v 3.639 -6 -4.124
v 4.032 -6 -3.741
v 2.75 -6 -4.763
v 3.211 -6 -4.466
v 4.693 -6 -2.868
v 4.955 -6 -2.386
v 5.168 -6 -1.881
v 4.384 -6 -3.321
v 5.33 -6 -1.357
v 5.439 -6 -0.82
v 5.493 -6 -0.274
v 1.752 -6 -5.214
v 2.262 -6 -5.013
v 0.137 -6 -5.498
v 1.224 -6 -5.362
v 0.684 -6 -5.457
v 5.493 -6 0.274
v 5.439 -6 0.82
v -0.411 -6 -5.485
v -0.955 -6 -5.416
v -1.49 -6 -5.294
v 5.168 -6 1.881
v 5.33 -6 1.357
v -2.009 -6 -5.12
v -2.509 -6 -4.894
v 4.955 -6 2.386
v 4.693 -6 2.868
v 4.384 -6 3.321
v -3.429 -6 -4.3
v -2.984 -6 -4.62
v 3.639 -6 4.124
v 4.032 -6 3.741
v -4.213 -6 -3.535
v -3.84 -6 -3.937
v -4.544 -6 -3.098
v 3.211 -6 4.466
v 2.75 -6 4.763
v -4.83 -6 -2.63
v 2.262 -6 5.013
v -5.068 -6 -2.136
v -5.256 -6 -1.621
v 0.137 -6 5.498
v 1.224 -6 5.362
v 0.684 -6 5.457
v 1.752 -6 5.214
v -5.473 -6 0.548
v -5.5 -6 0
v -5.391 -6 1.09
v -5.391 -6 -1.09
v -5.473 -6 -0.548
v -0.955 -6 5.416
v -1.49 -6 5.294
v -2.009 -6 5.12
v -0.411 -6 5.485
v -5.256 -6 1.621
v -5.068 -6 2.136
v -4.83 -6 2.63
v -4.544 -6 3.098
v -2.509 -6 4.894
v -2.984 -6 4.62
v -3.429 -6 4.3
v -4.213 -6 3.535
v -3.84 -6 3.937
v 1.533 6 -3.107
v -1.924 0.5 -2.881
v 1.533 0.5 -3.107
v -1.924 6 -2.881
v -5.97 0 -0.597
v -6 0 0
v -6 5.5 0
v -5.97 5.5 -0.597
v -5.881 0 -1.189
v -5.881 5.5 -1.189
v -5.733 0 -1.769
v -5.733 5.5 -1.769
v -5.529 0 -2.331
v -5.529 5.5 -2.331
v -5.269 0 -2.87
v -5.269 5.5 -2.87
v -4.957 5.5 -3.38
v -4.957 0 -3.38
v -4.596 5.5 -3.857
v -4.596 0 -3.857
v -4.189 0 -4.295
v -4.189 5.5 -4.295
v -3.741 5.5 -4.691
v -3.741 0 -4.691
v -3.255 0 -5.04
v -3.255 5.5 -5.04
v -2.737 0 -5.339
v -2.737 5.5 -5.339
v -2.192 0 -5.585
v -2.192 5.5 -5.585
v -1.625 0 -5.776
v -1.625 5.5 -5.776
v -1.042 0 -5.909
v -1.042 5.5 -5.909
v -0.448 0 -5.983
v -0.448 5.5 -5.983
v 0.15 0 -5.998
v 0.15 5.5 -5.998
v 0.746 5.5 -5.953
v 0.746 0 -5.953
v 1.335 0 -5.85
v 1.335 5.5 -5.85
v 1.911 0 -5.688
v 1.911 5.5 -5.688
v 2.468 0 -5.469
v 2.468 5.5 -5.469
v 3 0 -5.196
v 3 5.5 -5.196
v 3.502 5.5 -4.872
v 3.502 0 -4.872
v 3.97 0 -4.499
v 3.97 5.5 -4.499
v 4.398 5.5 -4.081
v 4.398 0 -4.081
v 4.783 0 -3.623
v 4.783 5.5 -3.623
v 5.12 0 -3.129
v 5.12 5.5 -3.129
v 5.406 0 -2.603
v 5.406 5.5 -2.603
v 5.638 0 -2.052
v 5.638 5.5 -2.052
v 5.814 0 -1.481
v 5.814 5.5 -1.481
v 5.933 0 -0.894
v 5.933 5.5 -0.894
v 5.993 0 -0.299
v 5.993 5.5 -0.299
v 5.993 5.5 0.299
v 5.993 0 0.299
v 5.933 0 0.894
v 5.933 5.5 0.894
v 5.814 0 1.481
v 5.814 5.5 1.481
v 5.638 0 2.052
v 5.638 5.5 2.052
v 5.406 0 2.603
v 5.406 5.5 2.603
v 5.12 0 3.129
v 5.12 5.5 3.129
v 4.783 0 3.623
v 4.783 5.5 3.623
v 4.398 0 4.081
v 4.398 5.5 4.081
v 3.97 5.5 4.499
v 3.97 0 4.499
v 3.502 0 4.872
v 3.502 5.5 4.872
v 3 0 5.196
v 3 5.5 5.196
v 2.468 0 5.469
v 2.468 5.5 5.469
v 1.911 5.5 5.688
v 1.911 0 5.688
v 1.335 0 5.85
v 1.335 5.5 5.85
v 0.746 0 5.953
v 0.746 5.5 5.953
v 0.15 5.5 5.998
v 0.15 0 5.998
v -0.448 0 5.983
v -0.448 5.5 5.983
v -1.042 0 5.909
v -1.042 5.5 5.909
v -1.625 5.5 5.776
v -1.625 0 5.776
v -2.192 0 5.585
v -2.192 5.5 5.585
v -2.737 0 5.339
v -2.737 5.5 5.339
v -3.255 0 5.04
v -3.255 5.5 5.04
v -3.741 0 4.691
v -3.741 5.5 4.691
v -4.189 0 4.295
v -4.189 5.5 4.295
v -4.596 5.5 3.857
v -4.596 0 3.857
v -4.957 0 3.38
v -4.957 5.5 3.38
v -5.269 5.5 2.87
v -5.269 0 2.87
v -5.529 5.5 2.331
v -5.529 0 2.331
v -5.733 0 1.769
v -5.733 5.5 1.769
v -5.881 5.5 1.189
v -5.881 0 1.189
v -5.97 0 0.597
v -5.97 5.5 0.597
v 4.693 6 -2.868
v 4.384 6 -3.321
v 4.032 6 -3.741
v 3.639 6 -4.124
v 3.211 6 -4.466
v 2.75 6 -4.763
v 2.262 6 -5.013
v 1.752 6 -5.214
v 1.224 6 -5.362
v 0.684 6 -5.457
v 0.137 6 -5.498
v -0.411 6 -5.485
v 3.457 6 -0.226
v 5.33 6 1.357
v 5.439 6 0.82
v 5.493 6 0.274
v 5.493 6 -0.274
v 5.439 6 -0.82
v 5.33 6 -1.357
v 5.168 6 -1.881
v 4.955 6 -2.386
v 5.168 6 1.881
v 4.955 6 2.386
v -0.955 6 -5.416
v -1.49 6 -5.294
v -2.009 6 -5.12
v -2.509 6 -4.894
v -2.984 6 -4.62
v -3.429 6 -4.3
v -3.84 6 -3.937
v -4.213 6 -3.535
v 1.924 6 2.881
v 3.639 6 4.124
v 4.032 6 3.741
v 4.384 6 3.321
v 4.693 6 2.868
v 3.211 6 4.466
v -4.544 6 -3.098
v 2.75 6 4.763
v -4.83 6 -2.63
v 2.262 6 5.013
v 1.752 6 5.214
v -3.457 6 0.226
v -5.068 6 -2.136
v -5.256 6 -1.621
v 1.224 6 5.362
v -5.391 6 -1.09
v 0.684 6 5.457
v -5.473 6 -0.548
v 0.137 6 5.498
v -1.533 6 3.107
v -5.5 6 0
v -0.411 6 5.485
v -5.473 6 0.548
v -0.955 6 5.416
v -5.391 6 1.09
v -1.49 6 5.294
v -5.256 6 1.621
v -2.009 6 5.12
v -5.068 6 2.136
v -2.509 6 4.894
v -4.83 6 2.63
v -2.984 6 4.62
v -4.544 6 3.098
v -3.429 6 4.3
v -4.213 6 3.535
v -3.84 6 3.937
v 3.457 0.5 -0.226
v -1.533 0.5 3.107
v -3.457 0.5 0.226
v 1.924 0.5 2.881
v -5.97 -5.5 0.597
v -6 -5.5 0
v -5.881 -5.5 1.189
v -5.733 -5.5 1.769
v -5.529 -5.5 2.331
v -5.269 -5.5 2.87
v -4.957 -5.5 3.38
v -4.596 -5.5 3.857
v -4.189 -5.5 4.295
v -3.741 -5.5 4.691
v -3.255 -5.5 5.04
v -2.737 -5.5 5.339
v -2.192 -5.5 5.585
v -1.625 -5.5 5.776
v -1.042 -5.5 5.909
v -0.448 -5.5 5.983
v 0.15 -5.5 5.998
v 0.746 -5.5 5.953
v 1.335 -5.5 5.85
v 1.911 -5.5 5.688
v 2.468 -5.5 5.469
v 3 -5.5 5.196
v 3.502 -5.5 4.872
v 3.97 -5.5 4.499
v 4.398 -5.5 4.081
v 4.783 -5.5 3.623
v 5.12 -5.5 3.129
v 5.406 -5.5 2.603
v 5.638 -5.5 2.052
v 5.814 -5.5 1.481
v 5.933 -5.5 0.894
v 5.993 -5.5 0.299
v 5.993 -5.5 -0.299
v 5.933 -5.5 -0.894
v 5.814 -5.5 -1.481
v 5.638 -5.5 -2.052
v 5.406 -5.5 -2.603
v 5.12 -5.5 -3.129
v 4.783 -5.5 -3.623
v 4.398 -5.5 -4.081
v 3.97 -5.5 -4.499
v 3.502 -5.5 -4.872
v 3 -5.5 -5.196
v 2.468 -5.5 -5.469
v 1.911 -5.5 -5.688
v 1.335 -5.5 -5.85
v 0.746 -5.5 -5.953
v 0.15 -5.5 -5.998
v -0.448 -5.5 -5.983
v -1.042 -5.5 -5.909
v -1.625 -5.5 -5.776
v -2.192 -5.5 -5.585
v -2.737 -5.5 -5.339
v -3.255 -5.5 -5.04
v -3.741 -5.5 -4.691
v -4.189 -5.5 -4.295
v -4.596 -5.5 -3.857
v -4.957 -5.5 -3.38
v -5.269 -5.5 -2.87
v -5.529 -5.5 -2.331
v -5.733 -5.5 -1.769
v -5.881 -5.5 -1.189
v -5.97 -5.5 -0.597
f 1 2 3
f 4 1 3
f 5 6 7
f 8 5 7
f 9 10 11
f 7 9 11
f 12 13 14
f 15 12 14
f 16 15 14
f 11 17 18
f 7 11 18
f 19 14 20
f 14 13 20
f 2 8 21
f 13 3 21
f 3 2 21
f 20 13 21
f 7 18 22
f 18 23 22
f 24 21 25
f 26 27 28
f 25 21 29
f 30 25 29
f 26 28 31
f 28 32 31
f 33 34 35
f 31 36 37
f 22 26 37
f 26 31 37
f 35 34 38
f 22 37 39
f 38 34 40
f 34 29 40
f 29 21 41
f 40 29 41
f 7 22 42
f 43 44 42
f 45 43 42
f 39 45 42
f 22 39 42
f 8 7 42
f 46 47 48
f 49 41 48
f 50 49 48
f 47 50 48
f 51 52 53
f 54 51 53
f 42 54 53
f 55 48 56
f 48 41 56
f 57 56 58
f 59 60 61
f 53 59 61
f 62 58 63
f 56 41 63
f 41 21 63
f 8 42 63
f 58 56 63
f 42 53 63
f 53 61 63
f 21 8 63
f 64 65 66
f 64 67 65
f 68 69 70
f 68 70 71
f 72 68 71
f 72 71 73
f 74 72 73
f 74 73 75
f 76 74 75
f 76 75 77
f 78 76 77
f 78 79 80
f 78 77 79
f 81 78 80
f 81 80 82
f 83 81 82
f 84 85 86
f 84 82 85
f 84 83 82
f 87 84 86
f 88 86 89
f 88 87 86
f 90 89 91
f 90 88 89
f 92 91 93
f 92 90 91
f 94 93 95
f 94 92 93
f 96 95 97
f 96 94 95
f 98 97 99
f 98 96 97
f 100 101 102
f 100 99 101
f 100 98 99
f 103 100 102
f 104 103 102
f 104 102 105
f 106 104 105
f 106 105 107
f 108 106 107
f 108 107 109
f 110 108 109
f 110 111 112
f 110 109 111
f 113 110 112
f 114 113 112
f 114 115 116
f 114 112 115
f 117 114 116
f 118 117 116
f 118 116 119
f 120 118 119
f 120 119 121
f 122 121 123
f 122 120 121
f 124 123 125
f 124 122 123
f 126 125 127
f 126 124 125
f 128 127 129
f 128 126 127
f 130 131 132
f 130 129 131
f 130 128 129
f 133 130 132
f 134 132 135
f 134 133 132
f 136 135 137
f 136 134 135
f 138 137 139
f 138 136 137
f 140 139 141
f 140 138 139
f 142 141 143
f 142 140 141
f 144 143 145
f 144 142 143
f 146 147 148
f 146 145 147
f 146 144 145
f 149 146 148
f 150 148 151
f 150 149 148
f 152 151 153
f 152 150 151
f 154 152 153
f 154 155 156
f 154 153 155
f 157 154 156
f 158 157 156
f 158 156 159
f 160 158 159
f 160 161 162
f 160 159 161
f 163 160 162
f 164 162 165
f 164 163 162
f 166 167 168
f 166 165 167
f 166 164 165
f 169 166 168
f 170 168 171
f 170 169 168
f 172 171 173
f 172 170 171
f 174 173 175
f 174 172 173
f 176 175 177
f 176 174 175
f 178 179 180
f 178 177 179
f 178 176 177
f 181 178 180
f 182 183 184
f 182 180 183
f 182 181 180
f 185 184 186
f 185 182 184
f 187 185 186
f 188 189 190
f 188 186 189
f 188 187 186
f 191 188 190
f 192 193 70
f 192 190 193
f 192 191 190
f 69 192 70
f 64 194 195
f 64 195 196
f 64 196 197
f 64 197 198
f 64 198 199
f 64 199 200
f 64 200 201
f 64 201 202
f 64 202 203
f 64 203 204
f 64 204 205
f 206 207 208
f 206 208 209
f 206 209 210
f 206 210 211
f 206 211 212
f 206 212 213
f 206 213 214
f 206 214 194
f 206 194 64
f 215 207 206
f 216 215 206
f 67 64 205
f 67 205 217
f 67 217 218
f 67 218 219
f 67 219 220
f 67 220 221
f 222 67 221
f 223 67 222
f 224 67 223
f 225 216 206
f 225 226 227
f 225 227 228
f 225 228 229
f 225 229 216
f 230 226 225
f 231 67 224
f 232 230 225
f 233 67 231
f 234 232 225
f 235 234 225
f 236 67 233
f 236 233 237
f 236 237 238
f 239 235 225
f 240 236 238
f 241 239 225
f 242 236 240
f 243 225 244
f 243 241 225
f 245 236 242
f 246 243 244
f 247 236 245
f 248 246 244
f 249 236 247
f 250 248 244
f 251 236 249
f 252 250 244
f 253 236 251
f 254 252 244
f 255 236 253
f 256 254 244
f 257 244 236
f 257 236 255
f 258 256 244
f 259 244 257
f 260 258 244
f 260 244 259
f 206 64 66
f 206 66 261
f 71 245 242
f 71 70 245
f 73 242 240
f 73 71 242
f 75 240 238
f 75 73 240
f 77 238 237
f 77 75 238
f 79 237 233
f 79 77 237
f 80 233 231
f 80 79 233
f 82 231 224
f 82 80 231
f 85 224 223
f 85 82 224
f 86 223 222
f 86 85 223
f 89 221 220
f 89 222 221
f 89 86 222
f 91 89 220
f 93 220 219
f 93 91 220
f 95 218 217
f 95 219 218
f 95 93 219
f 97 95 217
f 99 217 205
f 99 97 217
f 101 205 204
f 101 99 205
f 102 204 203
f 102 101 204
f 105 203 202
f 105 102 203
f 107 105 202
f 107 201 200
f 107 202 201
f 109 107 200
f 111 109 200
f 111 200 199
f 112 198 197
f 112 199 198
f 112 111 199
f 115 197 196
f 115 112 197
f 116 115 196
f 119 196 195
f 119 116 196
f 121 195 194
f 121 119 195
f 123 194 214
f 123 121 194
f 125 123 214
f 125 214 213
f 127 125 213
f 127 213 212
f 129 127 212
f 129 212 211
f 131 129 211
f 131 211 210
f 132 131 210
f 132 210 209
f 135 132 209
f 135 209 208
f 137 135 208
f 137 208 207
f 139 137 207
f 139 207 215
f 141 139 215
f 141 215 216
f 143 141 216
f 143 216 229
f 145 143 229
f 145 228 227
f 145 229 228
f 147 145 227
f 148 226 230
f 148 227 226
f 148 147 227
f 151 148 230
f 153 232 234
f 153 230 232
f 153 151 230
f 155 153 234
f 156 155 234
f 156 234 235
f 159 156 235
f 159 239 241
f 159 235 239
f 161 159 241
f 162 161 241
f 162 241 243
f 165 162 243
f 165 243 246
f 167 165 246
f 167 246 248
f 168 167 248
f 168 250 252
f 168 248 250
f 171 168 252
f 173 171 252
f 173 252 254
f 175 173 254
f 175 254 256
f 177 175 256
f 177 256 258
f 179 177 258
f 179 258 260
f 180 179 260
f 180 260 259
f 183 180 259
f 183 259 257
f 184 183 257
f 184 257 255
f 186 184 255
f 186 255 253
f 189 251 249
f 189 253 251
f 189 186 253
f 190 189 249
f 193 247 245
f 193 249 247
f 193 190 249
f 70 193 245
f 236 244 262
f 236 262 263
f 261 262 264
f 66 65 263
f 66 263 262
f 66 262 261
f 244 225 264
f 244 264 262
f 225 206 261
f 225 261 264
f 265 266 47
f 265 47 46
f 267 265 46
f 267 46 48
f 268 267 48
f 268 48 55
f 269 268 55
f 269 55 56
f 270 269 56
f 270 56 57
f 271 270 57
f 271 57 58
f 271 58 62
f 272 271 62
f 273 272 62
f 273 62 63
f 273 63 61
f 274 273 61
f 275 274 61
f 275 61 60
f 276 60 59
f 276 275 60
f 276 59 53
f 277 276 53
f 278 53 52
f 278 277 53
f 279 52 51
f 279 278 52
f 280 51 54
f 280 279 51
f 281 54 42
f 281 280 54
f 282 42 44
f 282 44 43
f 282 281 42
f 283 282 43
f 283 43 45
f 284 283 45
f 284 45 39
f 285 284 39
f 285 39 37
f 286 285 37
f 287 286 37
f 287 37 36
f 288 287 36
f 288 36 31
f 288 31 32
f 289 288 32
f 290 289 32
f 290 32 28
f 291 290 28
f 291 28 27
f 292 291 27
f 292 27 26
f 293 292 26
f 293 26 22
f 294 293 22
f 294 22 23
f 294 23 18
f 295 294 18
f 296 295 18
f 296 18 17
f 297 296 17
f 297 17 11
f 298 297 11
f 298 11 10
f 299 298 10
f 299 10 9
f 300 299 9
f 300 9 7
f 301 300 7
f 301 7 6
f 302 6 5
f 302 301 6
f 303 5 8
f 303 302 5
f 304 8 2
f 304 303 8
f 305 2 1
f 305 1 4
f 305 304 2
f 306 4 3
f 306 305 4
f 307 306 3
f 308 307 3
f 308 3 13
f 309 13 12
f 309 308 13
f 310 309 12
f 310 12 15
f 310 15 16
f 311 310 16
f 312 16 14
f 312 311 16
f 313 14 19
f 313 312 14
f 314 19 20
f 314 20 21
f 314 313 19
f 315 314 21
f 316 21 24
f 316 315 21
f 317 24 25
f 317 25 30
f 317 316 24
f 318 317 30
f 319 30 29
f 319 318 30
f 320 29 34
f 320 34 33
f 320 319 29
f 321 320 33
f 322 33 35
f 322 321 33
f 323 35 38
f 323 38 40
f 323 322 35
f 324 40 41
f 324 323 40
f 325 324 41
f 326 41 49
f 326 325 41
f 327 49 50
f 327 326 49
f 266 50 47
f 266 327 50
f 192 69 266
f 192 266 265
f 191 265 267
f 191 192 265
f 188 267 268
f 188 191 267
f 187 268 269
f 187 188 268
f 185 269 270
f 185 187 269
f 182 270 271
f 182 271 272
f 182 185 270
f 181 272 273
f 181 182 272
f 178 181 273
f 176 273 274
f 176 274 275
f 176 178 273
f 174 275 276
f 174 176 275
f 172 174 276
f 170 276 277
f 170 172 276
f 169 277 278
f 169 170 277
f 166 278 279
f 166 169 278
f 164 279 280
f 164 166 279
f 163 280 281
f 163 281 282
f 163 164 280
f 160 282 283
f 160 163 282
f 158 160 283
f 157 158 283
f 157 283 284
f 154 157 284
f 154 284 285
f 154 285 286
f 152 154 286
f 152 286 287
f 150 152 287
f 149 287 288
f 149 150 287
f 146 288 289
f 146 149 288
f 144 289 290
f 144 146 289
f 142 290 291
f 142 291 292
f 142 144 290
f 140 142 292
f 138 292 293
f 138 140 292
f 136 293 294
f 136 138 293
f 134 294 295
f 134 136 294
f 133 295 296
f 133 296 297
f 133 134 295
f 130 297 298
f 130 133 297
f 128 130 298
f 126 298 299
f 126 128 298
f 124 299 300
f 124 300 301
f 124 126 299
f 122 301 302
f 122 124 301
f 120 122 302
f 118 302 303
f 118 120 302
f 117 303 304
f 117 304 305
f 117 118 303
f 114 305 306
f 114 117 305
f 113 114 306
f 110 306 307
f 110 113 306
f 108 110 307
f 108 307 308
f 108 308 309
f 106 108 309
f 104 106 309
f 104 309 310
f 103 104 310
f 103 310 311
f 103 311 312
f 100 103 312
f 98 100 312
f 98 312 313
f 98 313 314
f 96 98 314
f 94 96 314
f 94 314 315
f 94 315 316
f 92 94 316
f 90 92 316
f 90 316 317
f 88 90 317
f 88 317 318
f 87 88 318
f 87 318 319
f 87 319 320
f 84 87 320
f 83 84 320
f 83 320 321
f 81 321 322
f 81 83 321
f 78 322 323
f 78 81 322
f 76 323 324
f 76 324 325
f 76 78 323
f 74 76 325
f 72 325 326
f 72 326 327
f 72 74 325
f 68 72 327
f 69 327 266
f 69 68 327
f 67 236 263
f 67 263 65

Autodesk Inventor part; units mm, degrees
ref_plane "YZ Plane" through (0, 0, 0) normal (1, 0, 0) x (0, 1, 0)
ref_plane "XZ Plane" through (0, 0, 0) normal (0, 1, 0) x (-1, 0, 0)
ref_plane "XY Plane" through (0, 0, 0) normal (0, 0, 1) x (1, 0, 0)
sketch "Sketch1" plane through (0, 0, 0) normal (0, 1, 0) x (-1, 0, 0)
  circle A0 centre (0, 0) radius 6
  dimension "d3" = 12
extrude "Extrusion1" add sketch "Sketch1" along normal mid plane 12
sketch "Sketch2" plane through (0, 6, 0) normal (0, 1, 0) x (1, 0, 0)
  line L0 (1.5326, 3.1066) -> (3.4567, 0.226)
  line L1 (3.4567, 0.226) -> (1.9241, -2.8806)
  line L2 (1.9241, -2.8806) -> (-1.5326, -3.1066)
  line L3 (-1.5326, -3.1066) -> (-3.4567, -0.226)
  line L4 (-3.4567, -0.226) -> (-1.9241, 2.8806)
  line L5 (-1.9241, 2.8806) -> (1.5326, 3.1066)
  point P0 (0, 0)
  point P1 (0, 0)
  dimension "d2" = 6
extrude "Extrusion2" cut sketch "Sketch2" against normal blind 5.5
thread "Thread1" size "M12x1.75" class "6g" standard "ANSI Metric M Profile" length 10
chamfer "Chamfer1" distance 0.5 angle 45 2 edges at (6, 6, 0) (6, -6, 0)
properties part number "M12_HEX"
